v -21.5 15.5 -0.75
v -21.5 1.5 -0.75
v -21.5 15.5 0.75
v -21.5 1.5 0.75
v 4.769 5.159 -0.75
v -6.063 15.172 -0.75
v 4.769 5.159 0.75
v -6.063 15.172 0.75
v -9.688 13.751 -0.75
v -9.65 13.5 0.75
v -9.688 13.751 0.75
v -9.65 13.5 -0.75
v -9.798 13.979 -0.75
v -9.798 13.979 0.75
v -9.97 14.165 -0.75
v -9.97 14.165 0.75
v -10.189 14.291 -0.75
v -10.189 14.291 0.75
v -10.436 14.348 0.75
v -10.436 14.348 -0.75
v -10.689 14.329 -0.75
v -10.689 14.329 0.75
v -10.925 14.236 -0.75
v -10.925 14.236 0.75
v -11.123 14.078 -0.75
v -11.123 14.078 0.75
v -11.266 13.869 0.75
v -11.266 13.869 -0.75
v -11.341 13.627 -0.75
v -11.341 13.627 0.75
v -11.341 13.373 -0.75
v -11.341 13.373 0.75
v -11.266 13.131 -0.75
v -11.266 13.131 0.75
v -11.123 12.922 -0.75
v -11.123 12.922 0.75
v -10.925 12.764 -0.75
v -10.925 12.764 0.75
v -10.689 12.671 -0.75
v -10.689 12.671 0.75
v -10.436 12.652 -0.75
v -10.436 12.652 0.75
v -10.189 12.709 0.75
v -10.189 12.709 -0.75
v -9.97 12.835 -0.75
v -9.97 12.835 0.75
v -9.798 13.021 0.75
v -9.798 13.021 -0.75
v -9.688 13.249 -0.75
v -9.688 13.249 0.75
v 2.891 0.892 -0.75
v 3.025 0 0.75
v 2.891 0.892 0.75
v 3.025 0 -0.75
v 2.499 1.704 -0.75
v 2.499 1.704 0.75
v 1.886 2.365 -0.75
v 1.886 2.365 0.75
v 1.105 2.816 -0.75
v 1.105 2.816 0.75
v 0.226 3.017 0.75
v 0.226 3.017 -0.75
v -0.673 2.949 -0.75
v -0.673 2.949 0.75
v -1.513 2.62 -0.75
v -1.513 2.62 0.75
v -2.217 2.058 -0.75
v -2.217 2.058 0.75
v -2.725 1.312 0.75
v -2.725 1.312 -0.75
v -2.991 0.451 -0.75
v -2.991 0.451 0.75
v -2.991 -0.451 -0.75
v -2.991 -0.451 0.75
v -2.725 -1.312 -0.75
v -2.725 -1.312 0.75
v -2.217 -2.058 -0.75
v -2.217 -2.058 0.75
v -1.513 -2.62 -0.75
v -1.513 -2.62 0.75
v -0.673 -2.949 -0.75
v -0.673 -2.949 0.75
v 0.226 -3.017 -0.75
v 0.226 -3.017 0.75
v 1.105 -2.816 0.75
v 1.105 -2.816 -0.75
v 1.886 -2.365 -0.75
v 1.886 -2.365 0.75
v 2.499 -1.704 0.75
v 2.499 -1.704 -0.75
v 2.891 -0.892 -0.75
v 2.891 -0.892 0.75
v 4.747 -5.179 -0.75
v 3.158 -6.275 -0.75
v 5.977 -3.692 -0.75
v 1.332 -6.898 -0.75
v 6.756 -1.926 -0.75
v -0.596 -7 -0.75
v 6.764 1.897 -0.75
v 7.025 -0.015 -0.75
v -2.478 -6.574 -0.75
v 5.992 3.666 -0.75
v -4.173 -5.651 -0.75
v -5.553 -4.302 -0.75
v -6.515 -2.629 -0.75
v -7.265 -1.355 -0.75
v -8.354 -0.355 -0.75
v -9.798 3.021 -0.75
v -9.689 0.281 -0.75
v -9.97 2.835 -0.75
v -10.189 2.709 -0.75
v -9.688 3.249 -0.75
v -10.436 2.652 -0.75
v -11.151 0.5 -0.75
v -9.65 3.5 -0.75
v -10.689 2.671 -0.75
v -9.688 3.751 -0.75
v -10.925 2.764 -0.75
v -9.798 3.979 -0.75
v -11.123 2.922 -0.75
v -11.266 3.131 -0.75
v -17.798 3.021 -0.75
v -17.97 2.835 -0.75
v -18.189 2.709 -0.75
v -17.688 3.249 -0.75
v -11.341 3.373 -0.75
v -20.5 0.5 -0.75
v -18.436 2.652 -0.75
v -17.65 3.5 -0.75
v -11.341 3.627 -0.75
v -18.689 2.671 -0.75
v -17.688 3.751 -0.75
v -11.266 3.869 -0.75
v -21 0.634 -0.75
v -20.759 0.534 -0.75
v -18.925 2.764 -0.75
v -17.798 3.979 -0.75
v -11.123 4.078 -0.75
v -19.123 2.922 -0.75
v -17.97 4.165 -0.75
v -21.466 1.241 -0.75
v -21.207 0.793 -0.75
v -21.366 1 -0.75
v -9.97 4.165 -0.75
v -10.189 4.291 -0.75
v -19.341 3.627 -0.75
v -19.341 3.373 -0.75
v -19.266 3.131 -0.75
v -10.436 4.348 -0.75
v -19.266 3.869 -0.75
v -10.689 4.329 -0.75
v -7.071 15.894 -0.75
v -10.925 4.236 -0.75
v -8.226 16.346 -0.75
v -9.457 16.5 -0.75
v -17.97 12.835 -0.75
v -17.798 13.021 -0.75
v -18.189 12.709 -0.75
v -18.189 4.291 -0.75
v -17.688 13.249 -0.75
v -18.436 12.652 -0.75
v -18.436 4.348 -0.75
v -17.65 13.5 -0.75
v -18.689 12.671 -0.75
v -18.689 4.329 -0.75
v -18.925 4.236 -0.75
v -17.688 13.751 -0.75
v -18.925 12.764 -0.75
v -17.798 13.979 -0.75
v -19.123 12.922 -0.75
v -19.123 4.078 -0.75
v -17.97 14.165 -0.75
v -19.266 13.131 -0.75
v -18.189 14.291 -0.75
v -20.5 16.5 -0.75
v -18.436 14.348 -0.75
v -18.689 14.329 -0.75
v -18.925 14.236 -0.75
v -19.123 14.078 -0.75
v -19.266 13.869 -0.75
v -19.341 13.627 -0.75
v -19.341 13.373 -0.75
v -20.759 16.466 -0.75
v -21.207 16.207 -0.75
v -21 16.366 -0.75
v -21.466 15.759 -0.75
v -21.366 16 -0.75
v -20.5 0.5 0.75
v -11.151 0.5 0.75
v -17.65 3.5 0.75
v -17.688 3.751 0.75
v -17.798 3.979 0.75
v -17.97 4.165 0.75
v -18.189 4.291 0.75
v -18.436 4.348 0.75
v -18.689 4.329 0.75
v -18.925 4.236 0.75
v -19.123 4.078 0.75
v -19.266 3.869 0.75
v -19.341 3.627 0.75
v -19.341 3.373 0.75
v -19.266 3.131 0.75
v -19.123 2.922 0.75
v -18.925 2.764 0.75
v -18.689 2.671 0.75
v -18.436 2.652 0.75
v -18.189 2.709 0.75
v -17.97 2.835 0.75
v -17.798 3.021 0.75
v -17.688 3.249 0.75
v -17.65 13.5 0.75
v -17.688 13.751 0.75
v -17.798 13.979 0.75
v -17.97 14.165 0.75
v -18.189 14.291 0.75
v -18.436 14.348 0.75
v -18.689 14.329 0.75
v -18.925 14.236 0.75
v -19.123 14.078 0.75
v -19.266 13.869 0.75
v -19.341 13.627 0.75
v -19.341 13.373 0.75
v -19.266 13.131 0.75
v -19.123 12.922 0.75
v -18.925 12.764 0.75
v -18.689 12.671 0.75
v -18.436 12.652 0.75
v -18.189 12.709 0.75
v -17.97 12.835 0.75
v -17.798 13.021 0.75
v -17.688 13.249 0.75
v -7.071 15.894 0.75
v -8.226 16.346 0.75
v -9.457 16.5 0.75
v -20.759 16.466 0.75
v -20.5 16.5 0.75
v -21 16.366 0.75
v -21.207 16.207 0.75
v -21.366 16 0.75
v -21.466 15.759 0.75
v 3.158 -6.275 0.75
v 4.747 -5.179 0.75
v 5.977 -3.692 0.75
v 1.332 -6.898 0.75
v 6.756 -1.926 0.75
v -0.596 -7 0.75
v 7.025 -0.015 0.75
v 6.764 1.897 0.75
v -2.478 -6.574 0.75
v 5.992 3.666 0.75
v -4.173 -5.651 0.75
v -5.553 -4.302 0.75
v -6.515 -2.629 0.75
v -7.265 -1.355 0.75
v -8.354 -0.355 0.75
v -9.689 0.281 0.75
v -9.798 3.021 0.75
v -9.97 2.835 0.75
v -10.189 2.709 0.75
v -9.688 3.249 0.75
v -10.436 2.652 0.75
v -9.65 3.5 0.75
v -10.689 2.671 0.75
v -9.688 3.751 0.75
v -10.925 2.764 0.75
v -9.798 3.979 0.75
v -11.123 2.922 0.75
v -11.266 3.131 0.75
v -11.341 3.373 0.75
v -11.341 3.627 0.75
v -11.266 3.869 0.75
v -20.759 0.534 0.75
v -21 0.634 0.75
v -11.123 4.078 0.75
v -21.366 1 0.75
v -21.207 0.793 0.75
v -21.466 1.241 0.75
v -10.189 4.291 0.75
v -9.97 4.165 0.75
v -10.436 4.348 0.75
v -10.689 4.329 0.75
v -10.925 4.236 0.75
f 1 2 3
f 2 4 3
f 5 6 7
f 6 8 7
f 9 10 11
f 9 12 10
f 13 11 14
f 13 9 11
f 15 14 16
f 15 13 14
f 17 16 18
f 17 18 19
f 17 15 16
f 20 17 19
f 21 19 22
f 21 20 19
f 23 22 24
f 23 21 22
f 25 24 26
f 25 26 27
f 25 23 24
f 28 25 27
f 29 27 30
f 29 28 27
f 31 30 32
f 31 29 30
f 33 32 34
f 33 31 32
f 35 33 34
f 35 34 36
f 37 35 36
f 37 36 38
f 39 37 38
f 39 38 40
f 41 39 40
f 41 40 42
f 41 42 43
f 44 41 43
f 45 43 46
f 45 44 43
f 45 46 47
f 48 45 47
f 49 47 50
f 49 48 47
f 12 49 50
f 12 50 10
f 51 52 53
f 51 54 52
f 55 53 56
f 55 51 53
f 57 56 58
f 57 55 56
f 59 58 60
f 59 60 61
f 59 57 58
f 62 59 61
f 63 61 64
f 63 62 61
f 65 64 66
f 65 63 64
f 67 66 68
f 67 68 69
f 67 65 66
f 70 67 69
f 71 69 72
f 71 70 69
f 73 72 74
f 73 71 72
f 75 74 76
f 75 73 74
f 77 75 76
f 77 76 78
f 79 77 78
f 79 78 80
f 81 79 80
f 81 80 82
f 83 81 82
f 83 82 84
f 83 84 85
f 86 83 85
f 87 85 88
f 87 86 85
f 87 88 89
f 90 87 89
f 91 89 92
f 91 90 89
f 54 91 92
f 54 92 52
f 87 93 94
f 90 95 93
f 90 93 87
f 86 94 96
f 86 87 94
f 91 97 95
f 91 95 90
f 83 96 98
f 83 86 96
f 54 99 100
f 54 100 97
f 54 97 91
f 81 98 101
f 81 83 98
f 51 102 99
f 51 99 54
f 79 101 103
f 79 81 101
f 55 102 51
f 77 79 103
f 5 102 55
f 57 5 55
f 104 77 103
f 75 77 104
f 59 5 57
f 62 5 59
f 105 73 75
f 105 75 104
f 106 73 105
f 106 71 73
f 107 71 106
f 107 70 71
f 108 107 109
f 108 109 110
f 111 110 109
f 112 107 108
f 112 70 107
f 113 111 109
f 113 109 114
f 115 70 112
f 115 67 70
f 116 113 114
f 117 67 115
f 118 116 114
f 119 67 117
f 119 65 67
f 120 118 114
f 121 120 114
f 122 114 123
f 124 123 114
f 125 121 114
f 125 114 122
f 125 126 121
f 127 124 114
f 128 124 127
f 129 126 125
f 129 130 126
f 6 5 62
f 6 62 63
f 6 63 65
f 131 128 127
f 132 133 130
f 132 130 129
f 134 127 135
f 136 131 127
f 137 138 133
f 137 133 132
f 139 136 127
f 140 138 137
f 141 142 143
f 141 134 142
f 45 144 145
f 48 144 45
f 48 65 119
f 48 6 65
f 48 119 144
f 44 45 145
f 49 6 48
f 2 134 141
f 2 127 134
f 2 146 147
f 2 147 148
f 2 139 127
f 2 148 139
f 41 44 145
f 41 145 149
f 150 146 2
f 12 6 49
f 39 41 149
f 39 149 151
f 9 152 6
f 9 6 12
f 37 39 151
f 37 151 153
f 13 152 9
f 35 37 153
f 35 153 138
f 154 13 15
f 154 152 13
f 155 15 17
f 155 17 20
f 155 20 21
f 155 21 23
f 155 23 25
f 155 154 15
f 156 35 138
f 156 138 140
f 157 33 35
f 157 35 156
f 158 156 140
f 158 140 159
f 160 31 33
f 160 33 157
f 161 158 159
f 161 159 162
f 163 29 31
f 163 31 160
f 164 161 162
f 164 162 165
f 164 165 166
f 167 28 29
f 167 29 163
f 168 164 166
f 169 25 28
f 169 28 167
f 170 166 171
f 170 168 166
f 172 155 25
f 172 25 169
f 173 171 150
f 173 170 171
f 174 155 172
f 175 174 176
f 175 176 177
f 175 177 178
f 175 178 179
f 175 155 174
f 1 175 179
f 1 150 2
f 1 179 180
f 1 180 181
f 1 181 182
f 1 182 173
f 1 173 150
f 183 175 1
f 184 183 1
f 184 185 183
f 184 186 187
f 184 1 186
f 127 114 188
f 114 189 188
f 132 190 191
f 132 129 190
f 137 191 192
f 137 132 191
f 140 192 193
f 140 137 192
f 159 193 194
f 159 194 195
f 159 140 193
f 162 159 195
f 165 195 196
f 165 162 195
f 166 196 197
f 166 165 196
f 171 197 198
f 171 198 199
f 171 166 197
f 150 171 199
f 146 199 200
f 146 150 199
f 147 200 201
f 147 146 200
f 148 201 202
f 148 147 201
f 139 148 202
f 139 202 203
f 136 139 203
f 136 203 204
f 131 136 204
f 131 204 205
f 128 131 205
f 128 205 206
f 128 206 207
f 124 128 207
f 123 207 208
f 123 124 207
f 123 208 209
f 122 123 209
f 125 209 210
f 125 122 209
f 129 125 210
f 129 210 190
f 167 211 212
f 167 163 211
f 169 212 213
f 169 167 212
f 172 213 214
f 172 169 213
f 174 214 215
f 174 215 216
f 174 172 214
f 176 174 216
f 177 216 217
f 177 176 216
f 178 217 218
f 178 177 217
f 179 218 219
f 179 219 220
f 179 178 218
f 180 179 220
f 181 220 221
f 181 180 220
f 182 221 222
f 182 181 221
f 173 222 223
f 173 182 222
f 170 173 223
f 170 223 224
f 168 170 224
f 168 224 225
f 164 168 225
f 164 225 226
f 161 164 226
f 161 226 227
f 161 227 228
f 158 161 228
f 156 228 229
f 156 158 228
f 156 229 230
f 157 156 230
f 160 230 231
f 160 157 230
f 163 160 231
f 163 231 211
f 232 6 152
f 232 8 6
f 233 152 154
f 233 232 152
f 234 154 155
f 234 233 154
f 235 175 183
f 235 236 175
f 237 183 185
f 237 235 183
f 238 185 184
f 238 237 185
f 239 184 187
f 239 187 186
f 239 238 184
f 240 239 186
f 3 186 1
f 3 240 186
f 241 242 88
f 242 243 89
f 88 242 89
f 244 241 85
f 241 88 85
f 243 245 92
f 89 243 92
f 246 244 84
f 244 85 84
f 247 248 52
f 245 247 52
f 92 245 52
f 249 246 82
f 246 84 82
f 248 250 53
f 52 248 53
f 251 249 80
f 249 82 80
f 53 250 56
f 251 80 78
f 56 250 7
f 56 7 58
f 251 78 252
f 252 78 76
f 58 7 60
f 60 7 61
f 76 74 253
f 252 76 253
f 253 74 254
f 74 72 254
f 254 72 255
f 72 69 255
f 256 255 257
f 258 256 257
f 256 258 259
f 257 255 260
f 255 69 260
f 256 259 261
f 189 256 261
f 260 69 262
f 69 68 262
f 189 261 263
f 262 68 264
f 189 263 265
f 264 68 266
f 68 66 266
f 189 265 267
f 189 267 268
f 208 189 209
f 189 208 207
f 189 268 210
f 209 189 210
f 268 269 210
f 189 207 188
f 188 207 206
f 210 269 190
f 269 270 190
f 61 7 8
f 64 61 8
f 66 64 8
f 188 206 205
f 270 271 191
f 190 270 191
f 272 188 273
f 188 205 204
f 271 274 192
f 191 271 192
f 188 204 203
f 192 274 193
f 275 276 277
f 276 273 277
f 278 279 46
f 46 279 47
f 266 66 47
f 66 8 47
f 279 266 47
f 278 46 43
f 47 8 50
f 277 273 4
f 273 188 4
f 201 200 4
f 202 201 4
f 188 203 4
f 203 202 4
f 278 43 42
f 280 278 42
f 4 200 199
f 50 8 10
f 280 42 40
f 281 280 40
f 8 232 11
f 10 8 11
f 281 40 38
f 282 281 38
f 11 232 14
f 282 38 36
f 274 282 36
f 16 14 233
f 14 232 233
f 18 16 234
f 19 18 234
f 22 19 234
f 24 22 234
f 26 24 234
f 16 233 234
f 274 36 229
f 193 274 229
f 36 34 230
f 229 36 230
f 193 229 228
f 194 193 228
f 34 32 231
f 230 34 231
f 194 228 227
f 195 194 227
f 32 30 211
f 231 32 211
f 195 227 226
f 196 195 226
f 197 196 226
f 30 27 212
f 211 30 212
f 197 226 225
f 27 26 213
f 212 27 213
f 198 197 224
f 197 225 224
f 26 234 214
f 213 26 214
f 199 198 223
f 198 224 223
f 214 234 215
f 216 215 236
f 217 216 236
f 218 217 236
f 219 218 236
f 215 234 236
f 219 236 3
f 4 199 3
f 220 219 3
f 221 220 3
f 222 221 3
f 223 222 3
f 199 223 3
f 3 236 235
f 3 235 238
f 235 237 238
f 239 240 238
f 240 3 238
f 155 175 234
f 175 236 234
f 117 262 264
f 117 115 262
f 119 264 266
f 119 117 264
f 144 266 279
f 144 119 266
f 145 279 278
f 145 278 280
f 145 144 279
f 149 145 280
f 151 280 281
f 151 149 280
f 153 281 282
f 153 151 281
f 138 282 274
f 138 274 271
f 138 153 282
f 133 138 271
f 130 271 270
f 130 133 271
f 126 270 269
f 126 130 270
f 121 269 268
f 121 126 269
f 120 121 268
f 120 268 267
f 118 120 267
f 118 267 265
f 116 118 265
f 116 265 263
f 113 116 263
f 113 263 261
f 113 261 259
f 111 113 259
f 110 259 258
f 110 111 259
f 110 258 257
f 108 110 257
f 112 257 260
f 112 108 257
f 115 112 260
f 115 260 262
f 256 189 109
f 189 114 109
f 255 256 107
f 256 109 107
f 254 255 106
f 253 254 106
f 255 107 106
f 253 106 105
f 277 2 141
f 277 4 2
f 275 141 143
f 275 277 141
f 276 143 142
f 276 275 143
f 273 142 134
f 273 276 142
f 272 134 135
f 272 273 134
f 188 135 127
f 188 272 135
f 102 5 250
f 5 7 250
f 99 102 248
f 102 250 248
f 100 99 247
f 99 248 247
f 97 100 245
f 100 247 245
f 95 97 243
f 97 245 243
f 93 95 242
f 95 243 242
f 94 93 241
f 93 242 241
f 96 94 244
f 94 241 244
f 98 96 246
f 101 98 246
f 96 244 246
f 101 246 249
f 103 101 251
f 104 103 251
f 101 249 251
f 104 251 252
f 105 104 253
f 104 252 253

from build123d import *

# Parameters (mm, degrees)
ESQUISSE1_R        = 3.025
ESQUISSE1_R_2      = 0.85
BOSS_EXTRU_1_DEPTH = 0.75
CONG_1_R           = 5
CONG_2_R           = 1


with BuildPart() as part:
    # Esquisse1 → Boss.-Extru.1 (new body, symmetric)
    with BuildSketch(Plane.XY):
        with BuildLine():
            Line((-7.5, 16.5), (4.768672746, 5.158525491))
            ThreePointArc((4.768672746, 5.158525491), (2.584220944, -6.532413575), (-7.007183814, 0.5))
            Line((-7.007183814, 0.5), (-7.5, 0.5))
            Line((-7.5, 0.5), (-21.5, 0.5))
            Line((-21.5, 0.5), (-21.5, 16.5))
            Line((-21.5, 16.5), (-7.5, 16.5))
        make_face()
        Circle(ESQUISSE1_R, mode=Mode.SUBTRACT)
        with Locations((-18.5, 13.5)):
            Circle(ESQUISSE1_R_2, mode=Mode.SUBTRACT)
        with Locations((-10.5, 13.5)):
            Circle(ESQUISSE1_R_2, mode=Mode.SUBTRACT)
        with Locations((-10.5, 3.5)):
            Circle(ESQUISSE1_R_2, mode=Mode.SUBTRACT)
        with Locations((-18.5, 3.5)):
            Circle(ESQUISSE1_R_2, mode=Mode.SUBTRACT)
    extrude(amount=BOSS_EXTRU_1_DEPTH, both=True)

    # Congé1
    cong_1_edges = [part.edges().sort_by_distance(p)[0] for p in [
        (-7.5, 16.5, 0),
        (-7.007183814, 0.5, 0),
    ]]
    fillet(cong_1_edges, radius=CONG_1_R)

    # Congé2
    cong_2_edges = [part.edges().sort_by_distance(p)[0] for p in [
        (-21.5, 16.5, 0),
        (-21.5, 0.5, 0),
    ]]
    fillet(cong_2_edges, radius=CONG_2_R)


solid = part.part
